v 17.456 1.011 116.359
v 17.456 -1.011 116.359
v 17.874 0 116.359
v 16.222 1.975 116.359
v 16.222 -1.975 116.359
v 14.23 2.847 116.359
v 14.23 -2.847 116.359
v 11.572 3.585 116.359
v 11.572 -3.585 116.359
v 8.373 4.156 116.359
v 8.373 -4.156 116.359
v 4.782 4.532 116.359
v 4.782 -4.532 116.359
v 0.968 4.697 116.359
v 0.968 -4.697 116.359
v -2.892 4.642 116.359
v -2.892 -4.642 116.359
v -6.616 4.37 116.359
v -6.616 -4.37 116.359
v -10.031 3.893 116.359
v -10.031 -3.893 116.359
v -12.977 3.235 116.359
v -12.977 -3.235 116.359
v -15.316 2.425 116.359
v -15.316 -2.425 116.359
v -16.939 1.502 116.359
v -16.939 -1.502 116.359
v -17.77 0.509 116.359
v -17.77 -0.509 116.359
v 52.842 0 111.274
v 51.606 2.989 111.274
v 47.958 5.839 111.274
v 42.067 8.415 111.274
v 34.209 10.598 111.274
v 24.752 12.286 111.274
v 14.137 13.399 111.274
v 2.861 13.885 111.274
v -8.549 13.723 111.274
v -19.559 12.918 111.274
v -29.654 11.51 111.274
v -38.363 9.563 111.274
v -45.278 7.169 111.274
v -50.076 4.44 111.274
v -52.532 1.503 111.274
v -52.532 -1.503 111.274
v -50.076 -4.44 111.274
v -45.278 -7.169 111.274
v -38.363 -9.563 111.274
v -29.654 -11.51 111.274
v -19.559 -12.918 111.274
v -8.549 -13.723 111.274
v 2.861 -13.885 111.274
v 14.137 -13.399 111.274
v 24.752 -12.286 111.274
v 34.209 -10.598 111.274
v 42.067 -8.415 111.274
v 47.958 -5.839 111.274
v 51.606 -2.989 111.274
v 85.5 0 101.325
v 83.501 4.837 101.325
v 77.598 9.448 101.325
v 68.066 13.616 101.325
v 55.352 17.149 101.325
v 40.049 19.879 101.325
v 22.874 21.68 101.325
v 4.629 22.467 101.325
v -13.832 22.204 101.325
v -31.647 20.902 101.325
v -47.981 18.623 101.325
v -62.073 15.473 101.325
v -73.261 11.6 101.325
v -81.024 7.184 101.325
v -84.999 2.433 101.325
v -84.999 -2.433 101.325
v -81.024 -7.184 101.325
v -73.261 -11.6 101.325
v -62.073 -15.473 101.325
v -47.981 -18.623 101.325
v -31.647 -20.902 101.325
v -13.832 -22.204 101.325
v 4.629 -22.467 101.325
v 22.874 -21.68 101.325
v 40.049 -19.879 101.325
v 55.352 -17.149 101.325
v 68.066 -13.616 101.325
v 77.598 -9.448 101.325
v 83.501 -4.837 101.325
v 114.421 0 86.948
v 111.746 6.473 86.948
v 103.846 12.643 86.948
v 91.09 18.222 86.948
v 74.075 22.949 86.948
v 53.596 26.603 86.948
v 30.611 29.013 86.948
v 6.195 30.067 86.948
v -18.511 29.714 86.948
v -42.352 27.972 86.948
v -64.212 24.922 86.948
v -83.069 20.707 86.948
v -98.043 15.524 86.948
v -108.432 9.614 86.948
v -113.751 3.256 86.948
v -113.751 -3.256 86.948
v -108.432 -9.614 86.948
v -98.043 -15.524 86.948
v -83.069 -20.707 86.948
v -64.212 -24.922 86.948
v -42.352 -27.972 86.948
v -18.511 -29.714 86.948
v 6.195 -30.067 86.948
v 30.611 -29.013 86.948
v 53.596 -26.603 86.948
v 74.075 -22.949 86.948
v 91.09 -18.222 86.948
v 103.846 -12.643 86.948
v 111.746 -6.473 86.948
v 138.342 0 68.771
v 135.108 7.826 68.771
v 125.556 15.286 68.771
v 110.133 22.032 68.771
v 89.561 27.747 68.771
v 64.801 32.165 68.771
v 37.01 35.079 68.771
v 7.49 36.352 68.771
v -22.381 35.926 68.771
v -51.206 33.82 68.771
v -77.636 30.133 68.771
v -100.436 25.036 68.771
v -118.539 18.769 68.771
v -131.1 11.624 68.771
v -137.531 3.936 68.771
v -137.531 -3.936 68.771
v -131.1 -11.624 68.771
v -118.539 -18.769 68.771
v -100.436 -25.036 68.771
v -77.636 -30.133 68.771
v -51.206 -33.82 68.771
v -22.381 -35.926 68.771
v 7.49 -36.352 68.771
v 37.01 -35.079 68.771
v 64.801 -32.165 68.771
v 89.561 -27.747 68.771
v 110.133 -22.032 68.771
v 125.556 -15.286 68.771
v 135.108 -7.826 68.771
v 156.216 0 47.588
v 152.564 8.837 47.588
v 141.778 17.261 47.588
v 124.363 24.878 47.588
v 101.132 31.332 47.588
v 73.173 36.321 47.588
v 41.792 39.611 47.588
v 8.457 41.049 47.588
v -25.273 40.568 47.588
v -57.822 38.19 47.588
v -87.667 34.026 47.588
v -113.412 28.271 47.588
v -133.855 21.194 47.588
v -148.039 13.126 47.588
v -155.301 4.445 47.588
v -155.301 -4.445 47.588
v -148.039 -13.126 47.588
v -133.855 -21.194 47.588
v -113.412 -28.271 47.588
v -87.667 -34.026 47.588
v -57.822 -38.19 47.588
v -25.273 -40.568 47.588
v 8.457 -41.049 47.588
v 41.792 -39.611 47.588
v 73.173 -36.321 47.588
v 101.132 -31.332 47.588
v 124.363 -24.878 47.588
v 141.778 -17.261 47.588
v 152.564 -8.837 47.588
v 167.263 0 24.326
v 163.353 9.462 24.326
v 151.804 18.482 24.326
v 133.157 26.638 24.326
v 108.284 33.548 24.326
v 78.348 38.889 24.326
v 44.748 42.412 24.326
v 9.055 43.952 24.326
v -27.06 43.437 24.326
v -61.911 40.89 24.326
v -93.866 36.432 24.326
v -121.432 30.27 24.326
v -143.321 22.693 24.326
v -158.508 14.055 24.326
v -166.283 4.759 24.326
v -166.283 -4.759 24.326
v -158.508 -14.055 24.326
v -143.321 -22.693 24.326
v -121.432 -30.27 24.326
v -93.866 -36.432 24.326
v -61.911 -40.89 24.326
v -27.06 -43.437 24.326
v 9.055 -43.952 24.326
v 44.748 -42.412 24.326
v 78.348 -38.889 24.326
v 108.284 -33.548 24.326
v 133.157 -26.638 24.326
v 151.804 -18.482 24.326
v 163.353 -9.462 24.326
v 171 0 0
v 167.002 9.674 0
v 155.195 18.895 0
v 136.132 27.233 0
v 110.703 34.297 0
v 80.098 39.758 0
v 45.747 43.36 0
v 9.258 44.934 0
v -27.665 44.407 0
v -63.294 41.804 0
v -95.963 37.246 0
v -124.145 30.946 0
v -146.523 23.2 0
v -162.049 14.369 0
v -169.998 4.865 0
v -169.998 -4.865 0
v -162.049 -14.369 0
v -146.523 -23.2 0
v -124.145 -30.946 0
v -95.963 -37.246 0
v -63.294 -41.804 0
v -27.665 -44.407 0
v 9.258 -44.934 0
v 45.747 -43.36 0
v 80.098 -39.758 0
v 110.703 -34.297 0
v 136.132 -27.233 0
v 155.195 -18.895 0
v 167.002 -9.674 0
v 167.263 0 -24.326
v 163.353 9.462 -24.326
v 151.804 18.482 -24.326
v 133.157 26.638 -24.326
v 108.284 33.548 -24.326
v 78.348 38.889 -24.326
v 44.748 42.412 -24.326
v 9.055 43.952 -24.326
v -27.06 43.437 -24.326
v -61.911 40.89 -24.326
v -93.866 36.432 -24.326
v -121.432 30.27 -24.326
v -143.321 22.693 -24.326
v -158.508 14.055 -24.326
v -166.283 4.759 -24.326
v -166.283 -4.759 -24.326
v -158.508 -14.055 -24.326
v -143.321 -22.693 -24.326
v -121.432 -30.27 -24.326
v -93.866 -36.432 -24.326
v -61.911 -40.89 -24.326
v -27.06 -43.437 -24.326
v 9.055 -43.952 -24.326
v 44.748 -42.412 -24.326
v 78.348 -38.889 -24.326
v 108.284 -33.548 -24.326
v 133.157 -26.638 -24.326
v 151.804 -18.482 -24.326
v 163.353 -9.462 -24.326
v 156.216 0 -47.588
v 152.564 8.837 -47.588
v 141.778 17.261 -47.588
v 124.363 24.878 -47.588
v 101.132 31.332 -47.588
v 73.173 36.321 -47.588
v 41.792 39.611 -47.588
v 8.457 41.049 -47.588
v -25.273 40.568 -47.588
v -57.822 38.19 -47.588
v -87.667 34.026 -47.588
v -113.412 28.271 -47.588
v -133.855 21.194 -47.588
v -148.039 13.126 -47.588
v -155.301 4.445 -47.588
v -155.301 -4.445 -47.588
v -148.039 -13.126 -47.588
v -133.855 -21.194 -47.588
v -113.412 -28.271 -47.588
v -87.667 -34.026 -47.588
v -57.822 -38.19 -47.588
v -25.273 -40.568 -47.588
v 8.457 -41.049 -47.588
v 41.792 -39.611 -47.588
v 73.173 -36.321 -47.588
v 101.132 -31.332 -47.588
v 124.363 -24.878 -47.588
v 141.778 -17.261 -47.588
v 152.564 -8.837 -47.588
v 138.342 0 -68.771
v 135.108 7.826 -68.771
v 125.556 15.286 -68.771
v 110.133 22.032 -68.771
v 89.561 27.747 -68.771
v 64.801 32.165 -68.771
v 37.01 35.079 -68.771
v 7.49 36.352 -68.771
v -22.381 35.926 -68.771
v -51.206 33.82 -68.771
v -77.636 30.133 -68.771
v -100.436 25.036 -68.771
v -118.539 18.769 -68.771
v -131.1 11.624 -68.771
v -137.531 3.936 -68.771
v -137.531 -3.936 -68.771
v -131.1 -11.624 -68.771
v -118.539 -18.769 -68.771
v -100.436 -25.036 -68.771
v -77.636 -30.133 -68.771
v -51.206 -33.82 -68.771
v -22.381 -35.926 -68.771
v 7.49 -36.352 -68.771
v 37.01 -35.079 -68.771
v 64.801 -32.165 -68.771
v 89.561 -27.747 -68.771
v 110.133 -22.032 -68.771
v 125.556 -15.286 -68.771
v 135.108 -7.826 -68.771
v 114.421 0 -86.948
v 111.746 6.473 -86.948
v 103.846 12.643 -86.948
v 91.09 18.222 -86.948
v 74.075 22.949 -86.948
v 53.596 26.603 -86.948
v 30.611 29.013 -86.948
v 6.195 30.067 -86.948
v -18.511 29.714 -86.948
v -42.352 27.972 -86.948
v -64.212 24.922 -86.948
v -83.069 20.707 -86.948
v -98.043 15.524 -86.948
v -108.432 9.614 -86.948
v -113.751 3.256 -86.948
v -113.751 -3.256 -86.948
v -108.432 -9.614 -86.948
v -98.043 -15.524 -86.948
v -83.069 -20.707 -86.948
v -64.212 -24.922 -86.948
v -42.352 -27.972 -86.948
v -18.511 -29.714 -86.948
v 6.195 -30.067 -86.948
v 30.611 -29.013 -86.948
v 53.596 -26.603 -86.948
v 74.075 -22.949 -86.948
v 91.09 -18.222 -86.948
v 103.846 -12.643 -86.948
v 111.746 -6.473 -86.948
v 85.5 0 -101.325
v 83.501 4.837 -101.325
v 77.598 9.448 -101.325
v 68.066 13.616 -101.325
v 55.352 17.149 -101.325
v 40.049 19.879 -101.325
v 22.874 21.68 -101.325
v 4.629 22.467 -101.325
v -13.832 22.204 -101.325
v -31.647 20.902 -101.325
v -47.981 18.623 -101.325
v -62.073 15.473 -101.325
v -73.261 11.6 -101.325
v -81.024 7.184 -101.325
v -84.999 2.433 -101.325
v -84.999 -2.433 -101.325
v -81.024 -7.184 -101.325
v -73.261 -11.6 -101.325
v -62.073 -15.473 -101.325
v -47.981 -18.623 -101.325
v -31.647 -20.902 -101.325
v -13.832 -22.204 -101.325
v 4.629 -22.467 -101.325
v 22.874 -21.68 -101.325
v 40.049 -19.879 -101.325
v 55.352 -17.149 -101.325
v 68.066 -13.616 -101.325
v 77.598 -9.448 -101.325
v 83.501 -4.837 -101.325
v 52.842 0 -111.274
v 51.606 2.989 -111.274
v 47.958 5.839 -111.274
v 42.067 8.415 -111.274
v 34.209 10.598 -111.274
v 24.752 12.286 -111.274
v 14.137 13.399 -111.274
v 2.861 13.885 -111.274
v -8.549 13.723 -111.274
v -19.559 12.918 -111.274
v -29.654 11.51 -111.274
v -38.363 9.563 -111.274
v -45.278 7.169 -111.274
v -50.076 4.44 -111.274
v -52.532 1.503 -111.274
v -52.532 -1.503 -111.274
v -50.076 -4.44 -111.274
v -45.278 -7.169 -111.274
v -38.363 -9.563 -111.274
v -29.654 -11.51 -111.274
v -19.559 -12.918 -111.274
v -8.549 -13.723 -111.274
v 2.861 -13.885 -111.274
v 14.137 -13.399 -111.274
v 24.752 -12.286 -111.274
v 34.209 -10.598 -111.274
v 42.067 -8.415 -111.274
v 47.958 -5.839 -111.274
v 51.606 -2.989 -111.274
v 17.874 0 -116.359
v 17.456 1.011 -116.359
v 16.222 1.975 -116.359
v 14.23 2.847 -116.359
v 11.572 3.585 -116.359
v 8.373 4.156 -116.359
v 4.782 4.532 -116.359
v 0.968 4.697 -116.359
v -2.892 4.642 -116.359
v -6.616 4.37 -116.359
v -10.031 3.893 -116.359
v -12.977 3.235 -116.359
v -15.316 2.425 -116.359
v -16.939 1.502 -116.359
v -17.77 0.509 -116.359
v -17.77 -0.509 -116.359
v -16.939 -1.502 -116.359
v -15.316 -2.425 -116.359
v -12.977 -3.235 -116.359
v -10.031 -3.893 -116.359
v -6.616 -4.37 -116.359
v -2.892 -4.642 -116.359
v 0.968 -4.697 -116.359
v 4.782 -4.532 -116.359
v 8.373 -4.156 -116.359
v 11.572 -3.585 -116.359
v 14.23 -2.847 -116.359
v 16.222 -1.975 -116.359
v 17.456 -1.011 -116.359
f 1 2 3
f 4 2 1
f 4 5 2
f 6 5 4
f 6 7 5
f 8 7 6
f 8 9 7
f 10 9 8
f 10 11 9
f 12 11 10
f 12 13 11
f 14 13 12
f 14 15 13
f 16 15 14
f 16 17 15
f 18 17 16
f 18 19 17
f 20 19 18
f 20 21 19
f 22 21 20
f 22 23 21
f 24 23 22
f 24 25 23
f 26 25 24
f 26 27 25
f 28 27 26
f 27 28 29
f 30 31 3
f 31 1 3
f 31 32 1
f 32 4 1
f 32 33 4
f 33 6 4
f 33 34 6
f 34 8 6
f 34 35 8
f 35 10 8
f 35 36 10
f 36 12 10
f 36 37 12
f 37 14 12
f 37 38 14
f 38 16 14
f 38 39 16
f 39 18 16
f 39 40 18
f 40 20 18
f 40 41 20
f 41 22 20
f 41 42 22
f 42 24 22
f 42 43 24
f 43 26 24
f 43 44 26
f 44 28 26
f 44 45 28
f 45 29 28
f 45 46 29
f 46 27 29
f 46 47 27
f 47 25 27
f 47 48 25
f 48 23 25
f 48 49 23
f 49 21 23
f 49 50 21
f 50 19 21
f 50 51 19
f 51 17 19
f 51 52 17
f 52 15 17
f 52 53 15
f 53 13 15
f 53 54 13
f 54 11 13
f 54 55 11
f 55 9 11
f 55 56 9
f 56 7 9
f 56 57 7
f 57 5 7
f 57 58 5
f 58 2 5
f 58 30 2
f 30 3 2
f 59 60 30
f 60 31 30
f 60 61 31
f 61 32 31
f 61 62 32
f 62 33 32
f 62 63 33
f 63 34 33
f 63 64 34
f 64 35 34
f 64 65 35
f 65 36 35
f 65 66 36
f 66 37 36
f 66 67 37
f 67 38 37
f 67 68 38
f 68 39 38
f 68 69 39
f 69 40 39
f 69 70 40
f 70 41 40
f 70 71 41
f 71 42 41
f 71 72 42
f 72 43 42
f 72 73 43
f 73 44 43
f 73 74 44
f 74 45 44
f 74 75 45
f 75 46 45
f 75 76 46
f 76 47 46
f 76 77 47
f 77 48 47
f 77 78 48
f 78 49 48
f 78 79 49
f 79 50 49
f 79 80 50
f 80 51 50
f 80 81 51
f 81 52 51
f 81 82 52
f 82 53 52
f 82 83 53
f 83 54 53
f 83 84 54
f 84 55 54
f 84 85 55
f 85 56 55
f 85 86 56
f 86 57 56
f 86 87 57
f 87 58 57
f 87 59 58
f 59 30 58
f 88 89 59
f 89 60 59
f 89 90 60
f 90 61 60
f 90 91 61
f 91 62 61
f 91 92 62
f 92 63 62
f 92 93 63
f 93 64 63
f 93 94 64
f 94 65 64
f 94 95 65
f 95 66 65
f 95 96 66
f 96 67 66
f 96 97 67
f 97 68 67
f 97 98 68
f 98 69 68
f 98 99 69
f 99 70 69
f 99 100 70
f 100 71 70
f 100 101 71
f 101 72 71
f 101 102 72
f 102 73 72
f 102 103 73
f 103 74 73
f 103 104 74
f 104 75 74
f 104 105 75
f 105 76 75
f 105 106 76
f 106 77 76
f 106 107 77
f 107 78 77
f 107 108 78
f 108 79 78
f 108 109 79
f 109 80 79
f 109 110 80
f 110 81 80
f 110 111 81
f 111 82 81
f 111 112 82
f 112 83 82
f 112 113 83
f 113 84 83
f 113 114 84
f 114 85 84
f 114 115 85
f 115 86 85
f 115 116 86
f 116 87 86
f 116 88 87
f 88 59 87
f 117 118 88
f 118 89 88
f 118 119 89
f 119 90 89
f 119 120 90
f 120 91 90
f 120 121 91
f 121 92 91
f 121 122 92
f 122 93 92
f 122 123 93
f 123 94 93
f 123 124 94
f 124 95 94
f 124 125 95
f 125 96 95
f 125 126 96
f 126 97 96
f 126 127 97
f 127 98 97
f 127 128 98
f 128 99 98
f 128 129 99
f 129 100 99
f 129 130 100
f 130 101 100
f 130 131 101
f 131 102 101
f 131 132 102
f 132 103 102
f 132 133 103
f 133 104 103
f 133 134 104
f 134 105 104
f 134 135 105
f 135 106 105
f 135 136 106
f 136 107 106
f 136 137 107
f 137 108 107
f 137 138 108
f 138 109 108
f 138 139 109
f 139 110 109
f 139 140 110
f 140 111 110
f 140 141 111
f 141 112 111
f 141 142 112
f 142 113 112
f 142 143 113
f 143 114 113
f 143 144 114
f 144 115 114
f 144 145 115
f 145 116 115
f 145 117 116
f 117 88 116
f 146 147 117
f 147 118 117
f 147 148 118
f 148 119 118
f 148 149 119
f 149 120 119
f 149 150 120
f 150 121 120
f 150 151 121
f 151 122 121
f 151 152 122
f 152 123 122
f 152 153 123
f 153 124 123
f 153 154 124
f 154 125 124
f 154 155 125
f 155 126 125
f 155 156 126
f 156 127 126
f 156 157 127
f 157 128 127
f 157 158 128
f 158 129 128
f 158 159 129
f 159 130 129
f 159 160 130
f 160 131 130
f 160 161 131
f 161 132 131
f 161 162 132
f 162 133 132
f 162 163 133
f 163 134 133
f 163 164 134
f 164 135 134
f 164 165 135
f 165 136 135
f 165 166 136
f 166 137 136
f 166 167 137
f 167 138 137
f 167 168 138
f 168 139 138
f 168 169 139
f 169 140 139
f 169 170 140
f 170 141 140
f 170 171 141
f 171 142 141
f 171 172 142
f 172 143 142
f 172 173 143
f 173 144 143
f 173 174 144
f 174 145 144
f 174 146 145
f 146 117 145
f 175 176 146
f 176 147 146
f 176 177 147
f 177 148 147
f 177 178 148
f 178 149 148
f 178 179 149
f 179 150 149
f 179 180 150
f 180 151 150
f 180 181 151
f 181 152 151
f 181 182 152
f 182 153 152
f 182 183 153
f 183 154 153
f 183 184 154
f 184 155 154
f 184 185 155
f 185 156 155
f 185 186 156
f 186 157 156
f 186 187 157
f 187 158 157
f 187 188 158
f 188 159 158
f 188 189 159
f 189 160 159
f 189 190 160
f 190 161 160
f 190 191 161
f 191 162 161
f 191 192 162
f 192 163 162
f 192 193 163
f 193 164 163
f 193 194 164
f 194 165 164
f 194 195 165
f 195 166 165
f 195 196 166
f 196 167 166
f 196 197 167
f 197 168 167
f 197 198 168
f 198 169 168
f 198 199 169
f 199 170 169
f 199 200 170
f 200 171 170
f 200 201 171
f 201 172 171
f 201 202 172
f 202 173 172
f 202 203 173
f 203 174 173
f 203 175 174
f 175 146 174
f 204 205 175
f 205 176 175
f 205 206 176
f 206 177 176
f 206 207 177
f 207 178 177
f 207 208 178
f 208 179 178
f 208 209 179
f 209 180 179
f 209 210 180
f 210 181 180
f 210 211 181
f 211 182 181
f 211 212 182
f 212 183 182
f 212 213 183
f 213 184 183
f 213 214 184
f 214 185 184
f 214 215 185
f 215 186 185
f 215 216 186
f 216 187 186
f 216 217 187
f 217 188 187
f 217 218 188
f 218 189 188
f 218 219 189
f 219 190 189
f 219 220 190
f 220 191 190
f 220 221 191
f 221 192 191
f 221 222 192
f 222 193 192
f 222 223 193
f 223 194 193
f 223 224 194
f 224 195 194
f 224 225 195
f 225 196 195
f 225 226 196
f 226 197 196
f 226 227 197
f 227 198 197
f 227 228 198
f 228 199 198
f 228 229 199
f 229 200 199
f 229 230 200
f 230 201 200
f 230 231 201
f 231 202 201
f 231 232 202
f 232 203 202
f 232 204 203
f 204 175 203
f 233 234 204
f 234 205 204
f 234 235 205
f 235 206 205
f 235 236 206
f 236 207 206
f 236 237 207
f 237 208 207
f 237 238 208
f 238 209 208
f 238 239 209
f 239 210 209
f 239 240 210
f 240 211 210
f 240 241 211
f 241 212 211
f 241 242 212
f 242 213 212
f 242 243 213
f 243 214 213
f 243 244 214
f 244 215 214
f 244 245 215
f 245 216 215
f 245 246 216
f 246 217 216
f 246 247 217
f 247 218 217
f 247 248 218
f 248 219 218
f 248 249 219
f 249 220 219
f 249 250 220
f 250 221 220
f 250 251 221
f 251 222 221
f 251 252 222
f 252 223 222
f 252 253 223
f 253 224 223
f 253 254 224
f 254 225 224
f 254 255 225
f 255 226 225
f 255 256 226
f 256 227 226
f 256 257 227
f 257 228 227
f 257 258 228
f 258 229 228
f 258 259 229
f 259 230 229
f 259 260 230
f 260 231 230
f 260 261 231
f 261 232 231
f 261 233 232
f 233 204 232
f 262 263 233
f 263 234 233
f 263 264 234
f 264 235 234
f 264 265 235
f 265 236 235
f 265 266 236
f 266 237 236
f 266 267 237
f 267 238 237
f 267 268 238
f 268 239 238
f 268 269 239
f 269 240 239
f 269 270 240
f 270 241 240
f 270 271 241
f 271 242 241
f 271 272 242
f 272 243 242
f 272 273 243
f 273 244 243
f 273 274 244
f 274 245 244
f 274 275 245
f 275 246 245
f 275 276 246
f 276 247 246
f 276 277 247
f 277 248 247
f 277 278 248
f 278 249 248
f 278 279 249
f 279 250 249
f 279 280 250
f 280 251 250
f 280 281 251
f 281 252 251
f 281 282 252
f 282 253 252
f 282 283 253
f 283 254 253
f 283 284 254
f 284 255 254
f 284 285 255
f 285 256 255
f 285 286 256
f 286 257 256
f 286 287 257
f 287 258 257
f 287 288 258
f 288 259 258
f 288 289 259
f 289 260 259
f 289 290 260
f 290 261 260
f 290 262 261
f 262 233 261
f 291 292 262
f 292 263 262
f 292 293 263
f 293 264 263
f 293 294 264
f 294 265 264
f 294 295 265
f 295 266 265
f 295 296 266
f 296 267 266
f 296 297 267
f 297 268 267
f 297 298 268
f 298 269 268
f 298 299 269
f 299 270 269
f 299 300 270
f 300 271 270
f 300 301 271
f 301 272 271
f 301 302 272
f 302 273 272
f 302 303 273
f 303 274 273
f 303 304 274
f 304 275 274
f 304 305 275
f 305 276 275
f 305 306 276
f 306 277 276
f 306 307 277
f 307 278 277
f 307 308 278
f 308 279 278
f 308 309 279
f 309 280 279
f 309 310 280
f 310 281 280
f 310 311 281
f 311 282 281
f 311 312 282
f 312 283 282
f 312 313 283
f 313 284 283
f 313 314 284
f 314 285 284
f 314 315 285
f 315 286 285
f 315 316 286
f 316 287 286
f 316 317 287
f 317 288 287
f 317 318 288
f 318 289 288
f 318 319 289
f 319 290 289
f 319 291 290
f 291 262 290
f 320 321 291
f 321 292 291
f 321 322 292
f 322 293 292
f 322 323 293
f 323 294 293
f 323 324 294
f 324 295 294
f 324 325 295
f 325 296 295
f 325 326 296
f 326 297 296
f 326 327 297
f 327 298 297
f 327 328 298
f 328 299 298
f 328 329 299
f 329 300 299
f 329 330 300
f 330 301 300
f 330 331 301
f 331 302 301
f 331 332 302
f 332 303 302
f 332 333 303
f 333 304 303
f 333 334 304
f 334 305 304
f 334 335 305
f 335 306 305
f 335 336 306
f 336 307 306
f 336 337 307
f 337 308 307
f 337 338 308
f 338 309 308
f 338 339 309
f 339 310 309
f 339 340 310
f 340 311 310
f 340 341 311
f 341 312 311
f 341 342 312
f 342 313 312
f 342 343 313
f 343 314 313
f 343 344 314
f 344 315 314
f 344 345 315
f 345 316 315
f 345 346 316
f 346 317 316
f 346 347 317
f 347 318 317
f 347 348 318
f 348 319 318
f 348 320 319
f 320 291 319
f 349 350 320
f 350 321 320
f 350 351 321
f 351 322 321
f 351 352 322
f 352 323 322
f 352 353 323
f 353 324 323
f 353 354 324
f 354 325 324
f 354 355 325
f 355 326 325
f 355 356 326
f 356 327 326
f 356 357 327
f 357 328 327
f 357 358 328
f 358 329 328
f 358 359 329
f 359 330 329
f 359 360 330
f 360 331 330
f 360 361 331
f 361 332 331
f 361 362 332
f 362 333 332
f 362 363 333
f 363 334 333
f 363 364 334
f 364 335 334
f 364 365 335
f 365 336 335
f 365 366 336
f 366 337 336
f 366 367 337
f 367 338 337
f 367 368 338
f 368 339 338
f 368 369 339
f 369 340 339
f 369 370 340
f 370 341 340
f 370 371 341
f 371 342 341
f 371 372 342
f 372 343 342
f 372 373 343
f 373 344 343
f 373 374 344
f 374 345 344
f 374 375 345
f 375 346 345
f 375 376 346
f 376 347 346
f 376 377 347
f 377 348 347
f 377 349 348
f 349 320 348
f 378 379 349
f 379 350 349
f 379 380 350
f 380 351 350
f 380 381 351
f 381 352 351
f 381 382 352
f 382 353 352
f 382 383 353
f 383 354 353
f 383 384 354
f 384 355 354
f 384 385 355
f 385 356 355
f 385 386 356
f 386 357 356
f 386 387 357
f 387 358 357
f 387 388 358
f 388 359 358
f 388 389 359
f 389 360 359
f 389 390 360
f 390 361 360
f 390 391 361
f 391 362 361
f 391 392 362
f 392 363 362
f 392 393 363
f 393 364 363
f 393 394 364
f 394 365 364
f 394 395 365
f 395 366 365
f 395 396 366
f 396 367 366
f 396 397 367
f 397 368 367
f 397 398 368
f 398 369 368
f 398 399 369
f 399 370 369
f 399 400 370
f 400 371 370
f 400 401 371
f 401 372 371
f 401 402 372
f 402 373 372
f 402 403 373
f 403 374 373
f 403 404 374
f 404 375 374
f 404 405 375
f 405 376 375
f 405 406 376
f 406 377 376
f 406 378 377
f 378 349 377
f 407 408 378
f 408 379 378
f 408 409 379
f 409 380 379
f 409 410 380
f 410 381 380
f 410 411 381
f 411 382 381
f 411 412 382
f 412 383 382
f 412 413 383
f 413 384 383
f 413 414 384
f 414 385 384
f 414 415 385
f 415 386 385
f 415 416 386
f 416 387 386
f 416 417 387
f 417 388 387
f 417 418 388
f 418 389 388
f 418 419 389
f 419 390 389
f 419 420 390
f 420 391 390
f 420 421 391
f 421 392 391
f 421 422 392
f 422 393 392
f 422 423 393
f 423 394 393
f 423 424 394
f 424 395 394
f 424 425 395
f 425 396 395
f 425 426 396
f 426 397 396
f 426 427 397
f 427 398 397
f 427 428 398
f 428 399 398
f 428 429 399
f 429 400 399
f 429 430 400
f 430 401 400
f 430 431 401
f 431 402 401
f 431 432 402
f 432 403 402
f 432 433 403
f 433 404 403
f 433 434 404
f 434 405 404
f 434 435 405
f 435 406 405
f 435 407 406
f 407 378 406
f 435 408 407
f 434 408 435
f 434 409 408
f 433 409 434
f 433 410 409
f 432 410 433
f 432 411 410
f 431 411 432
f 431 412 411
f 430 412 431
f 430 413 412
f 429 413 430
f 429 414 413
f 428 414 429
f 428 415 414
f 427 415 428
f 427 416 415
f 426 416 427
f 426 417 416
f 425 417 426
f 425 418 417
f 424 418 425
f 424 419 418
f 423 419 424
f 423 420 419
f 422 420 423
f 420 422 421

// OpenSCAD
// Generated by SolidPython 1.0.1 on 2020-07-29 00:46:53


scale(v = [19, 5, 13]) {
	sphere(r = 9);
}
/***********************************************
*********      SolidPython code:      **********
************************************************
 
# import packages: SolidPython
from solid import *
from solid.utils import *
from itertools import chain, combinations, permutations


class Resize:

    def __init__(self, scad_file):
        self.scad_file = scad_file
        #self.scad_file = import_scad(scad_file)
        # cone/cylinder param:
        self.r1 = 0
        self.r2 = 0
        self.h = 0
        # rectangular prism param:
        self.w = 0
        self.l = 0
        # ellipse param:
        self.r = 0

    # import OpenScad code (file name corresponds to shape)


    # classify shape + parameters
    def assign(self, param1, param2, param3):
        if self.scad_file == 'cone.scad':
            self.r1 = param1
            self.r2 = param2
            self.h = param3
        elif self.scad_file == 'cylinder.scad':
            self.r1 = param1
            self.r2 = param2
            self.h = param3
        elif self.scad_file == 'rectangularPrism.scad':
            self.h = param1
            self.l = param2
            self.w = param3
        else:
            self.r = param1
            self.h = param2

    # resize parameters
    def iterate(self):
        x = range(3, 20, 2)
        i = 1
        if self.scad_file == 'cone.scad':
            tempList = list(permutations(x, 2))
            for temp in tempList:
                param1 = temp[0]
                param2 = temp[1]
                filepath = 'produced_scad_files/' + 'cone' + str(param1) + '_' + str(param2) + '_' + '.scad'
                scad_render_to_file(cylinder(h=param1, r1=param2, r2=0), filepath)

        elif self.scad_file == 'cylinder.scad':
            tempList = list(permutations(x, 3))
            for temp in tempList:
                param1 = temp[0]
                param2 = temp[1]
                filepath = 'produced_scad_files/' + 'cylinder' + str(param1) + '_' + str(param2) + '_' + '.scad'
                scad_render_to_file(cylinder(h=param1, r1=param2, r2=param2), filepath)

        elif self.scad_file == 'rectangularPrism.scad':
            tempList = list(permutations(x, 3))
            for temp in tempList:
                param1 = temp[0]
                param2 = temp[1]
                param3 = temp[2]
                filepath = 'produced_scad_files/' + 'rectangularPrism' + str(param1) + '_' + str(param2) + '_' + str(
                    param3) + '.scad'
                scad_render_to_file(cube(size=(param1, param2, param3)), filepath)

        elif self.scad_file == 'ellipse.scad':
            tempList = list(permutations(x, 4))
            for temp in tempList:
                param1 = temp[0]
                param2 = temp[1]
                param3 = temp[2]
                param4 = temp[3]
                filepath = 'produced_scad_files/' + 'ellipse' + str(param1) + '_' + str(param2) + '_' + str(param3) + '_' + str(param4) + '.scad'
                scad_render_to_file(scale([param1, param2, param3])(sphere(r=param4)), filepath)

    def render_to_scadfile(self):
        scad_render_to_file(scad, 'example.scad') 
 
************************************************/
